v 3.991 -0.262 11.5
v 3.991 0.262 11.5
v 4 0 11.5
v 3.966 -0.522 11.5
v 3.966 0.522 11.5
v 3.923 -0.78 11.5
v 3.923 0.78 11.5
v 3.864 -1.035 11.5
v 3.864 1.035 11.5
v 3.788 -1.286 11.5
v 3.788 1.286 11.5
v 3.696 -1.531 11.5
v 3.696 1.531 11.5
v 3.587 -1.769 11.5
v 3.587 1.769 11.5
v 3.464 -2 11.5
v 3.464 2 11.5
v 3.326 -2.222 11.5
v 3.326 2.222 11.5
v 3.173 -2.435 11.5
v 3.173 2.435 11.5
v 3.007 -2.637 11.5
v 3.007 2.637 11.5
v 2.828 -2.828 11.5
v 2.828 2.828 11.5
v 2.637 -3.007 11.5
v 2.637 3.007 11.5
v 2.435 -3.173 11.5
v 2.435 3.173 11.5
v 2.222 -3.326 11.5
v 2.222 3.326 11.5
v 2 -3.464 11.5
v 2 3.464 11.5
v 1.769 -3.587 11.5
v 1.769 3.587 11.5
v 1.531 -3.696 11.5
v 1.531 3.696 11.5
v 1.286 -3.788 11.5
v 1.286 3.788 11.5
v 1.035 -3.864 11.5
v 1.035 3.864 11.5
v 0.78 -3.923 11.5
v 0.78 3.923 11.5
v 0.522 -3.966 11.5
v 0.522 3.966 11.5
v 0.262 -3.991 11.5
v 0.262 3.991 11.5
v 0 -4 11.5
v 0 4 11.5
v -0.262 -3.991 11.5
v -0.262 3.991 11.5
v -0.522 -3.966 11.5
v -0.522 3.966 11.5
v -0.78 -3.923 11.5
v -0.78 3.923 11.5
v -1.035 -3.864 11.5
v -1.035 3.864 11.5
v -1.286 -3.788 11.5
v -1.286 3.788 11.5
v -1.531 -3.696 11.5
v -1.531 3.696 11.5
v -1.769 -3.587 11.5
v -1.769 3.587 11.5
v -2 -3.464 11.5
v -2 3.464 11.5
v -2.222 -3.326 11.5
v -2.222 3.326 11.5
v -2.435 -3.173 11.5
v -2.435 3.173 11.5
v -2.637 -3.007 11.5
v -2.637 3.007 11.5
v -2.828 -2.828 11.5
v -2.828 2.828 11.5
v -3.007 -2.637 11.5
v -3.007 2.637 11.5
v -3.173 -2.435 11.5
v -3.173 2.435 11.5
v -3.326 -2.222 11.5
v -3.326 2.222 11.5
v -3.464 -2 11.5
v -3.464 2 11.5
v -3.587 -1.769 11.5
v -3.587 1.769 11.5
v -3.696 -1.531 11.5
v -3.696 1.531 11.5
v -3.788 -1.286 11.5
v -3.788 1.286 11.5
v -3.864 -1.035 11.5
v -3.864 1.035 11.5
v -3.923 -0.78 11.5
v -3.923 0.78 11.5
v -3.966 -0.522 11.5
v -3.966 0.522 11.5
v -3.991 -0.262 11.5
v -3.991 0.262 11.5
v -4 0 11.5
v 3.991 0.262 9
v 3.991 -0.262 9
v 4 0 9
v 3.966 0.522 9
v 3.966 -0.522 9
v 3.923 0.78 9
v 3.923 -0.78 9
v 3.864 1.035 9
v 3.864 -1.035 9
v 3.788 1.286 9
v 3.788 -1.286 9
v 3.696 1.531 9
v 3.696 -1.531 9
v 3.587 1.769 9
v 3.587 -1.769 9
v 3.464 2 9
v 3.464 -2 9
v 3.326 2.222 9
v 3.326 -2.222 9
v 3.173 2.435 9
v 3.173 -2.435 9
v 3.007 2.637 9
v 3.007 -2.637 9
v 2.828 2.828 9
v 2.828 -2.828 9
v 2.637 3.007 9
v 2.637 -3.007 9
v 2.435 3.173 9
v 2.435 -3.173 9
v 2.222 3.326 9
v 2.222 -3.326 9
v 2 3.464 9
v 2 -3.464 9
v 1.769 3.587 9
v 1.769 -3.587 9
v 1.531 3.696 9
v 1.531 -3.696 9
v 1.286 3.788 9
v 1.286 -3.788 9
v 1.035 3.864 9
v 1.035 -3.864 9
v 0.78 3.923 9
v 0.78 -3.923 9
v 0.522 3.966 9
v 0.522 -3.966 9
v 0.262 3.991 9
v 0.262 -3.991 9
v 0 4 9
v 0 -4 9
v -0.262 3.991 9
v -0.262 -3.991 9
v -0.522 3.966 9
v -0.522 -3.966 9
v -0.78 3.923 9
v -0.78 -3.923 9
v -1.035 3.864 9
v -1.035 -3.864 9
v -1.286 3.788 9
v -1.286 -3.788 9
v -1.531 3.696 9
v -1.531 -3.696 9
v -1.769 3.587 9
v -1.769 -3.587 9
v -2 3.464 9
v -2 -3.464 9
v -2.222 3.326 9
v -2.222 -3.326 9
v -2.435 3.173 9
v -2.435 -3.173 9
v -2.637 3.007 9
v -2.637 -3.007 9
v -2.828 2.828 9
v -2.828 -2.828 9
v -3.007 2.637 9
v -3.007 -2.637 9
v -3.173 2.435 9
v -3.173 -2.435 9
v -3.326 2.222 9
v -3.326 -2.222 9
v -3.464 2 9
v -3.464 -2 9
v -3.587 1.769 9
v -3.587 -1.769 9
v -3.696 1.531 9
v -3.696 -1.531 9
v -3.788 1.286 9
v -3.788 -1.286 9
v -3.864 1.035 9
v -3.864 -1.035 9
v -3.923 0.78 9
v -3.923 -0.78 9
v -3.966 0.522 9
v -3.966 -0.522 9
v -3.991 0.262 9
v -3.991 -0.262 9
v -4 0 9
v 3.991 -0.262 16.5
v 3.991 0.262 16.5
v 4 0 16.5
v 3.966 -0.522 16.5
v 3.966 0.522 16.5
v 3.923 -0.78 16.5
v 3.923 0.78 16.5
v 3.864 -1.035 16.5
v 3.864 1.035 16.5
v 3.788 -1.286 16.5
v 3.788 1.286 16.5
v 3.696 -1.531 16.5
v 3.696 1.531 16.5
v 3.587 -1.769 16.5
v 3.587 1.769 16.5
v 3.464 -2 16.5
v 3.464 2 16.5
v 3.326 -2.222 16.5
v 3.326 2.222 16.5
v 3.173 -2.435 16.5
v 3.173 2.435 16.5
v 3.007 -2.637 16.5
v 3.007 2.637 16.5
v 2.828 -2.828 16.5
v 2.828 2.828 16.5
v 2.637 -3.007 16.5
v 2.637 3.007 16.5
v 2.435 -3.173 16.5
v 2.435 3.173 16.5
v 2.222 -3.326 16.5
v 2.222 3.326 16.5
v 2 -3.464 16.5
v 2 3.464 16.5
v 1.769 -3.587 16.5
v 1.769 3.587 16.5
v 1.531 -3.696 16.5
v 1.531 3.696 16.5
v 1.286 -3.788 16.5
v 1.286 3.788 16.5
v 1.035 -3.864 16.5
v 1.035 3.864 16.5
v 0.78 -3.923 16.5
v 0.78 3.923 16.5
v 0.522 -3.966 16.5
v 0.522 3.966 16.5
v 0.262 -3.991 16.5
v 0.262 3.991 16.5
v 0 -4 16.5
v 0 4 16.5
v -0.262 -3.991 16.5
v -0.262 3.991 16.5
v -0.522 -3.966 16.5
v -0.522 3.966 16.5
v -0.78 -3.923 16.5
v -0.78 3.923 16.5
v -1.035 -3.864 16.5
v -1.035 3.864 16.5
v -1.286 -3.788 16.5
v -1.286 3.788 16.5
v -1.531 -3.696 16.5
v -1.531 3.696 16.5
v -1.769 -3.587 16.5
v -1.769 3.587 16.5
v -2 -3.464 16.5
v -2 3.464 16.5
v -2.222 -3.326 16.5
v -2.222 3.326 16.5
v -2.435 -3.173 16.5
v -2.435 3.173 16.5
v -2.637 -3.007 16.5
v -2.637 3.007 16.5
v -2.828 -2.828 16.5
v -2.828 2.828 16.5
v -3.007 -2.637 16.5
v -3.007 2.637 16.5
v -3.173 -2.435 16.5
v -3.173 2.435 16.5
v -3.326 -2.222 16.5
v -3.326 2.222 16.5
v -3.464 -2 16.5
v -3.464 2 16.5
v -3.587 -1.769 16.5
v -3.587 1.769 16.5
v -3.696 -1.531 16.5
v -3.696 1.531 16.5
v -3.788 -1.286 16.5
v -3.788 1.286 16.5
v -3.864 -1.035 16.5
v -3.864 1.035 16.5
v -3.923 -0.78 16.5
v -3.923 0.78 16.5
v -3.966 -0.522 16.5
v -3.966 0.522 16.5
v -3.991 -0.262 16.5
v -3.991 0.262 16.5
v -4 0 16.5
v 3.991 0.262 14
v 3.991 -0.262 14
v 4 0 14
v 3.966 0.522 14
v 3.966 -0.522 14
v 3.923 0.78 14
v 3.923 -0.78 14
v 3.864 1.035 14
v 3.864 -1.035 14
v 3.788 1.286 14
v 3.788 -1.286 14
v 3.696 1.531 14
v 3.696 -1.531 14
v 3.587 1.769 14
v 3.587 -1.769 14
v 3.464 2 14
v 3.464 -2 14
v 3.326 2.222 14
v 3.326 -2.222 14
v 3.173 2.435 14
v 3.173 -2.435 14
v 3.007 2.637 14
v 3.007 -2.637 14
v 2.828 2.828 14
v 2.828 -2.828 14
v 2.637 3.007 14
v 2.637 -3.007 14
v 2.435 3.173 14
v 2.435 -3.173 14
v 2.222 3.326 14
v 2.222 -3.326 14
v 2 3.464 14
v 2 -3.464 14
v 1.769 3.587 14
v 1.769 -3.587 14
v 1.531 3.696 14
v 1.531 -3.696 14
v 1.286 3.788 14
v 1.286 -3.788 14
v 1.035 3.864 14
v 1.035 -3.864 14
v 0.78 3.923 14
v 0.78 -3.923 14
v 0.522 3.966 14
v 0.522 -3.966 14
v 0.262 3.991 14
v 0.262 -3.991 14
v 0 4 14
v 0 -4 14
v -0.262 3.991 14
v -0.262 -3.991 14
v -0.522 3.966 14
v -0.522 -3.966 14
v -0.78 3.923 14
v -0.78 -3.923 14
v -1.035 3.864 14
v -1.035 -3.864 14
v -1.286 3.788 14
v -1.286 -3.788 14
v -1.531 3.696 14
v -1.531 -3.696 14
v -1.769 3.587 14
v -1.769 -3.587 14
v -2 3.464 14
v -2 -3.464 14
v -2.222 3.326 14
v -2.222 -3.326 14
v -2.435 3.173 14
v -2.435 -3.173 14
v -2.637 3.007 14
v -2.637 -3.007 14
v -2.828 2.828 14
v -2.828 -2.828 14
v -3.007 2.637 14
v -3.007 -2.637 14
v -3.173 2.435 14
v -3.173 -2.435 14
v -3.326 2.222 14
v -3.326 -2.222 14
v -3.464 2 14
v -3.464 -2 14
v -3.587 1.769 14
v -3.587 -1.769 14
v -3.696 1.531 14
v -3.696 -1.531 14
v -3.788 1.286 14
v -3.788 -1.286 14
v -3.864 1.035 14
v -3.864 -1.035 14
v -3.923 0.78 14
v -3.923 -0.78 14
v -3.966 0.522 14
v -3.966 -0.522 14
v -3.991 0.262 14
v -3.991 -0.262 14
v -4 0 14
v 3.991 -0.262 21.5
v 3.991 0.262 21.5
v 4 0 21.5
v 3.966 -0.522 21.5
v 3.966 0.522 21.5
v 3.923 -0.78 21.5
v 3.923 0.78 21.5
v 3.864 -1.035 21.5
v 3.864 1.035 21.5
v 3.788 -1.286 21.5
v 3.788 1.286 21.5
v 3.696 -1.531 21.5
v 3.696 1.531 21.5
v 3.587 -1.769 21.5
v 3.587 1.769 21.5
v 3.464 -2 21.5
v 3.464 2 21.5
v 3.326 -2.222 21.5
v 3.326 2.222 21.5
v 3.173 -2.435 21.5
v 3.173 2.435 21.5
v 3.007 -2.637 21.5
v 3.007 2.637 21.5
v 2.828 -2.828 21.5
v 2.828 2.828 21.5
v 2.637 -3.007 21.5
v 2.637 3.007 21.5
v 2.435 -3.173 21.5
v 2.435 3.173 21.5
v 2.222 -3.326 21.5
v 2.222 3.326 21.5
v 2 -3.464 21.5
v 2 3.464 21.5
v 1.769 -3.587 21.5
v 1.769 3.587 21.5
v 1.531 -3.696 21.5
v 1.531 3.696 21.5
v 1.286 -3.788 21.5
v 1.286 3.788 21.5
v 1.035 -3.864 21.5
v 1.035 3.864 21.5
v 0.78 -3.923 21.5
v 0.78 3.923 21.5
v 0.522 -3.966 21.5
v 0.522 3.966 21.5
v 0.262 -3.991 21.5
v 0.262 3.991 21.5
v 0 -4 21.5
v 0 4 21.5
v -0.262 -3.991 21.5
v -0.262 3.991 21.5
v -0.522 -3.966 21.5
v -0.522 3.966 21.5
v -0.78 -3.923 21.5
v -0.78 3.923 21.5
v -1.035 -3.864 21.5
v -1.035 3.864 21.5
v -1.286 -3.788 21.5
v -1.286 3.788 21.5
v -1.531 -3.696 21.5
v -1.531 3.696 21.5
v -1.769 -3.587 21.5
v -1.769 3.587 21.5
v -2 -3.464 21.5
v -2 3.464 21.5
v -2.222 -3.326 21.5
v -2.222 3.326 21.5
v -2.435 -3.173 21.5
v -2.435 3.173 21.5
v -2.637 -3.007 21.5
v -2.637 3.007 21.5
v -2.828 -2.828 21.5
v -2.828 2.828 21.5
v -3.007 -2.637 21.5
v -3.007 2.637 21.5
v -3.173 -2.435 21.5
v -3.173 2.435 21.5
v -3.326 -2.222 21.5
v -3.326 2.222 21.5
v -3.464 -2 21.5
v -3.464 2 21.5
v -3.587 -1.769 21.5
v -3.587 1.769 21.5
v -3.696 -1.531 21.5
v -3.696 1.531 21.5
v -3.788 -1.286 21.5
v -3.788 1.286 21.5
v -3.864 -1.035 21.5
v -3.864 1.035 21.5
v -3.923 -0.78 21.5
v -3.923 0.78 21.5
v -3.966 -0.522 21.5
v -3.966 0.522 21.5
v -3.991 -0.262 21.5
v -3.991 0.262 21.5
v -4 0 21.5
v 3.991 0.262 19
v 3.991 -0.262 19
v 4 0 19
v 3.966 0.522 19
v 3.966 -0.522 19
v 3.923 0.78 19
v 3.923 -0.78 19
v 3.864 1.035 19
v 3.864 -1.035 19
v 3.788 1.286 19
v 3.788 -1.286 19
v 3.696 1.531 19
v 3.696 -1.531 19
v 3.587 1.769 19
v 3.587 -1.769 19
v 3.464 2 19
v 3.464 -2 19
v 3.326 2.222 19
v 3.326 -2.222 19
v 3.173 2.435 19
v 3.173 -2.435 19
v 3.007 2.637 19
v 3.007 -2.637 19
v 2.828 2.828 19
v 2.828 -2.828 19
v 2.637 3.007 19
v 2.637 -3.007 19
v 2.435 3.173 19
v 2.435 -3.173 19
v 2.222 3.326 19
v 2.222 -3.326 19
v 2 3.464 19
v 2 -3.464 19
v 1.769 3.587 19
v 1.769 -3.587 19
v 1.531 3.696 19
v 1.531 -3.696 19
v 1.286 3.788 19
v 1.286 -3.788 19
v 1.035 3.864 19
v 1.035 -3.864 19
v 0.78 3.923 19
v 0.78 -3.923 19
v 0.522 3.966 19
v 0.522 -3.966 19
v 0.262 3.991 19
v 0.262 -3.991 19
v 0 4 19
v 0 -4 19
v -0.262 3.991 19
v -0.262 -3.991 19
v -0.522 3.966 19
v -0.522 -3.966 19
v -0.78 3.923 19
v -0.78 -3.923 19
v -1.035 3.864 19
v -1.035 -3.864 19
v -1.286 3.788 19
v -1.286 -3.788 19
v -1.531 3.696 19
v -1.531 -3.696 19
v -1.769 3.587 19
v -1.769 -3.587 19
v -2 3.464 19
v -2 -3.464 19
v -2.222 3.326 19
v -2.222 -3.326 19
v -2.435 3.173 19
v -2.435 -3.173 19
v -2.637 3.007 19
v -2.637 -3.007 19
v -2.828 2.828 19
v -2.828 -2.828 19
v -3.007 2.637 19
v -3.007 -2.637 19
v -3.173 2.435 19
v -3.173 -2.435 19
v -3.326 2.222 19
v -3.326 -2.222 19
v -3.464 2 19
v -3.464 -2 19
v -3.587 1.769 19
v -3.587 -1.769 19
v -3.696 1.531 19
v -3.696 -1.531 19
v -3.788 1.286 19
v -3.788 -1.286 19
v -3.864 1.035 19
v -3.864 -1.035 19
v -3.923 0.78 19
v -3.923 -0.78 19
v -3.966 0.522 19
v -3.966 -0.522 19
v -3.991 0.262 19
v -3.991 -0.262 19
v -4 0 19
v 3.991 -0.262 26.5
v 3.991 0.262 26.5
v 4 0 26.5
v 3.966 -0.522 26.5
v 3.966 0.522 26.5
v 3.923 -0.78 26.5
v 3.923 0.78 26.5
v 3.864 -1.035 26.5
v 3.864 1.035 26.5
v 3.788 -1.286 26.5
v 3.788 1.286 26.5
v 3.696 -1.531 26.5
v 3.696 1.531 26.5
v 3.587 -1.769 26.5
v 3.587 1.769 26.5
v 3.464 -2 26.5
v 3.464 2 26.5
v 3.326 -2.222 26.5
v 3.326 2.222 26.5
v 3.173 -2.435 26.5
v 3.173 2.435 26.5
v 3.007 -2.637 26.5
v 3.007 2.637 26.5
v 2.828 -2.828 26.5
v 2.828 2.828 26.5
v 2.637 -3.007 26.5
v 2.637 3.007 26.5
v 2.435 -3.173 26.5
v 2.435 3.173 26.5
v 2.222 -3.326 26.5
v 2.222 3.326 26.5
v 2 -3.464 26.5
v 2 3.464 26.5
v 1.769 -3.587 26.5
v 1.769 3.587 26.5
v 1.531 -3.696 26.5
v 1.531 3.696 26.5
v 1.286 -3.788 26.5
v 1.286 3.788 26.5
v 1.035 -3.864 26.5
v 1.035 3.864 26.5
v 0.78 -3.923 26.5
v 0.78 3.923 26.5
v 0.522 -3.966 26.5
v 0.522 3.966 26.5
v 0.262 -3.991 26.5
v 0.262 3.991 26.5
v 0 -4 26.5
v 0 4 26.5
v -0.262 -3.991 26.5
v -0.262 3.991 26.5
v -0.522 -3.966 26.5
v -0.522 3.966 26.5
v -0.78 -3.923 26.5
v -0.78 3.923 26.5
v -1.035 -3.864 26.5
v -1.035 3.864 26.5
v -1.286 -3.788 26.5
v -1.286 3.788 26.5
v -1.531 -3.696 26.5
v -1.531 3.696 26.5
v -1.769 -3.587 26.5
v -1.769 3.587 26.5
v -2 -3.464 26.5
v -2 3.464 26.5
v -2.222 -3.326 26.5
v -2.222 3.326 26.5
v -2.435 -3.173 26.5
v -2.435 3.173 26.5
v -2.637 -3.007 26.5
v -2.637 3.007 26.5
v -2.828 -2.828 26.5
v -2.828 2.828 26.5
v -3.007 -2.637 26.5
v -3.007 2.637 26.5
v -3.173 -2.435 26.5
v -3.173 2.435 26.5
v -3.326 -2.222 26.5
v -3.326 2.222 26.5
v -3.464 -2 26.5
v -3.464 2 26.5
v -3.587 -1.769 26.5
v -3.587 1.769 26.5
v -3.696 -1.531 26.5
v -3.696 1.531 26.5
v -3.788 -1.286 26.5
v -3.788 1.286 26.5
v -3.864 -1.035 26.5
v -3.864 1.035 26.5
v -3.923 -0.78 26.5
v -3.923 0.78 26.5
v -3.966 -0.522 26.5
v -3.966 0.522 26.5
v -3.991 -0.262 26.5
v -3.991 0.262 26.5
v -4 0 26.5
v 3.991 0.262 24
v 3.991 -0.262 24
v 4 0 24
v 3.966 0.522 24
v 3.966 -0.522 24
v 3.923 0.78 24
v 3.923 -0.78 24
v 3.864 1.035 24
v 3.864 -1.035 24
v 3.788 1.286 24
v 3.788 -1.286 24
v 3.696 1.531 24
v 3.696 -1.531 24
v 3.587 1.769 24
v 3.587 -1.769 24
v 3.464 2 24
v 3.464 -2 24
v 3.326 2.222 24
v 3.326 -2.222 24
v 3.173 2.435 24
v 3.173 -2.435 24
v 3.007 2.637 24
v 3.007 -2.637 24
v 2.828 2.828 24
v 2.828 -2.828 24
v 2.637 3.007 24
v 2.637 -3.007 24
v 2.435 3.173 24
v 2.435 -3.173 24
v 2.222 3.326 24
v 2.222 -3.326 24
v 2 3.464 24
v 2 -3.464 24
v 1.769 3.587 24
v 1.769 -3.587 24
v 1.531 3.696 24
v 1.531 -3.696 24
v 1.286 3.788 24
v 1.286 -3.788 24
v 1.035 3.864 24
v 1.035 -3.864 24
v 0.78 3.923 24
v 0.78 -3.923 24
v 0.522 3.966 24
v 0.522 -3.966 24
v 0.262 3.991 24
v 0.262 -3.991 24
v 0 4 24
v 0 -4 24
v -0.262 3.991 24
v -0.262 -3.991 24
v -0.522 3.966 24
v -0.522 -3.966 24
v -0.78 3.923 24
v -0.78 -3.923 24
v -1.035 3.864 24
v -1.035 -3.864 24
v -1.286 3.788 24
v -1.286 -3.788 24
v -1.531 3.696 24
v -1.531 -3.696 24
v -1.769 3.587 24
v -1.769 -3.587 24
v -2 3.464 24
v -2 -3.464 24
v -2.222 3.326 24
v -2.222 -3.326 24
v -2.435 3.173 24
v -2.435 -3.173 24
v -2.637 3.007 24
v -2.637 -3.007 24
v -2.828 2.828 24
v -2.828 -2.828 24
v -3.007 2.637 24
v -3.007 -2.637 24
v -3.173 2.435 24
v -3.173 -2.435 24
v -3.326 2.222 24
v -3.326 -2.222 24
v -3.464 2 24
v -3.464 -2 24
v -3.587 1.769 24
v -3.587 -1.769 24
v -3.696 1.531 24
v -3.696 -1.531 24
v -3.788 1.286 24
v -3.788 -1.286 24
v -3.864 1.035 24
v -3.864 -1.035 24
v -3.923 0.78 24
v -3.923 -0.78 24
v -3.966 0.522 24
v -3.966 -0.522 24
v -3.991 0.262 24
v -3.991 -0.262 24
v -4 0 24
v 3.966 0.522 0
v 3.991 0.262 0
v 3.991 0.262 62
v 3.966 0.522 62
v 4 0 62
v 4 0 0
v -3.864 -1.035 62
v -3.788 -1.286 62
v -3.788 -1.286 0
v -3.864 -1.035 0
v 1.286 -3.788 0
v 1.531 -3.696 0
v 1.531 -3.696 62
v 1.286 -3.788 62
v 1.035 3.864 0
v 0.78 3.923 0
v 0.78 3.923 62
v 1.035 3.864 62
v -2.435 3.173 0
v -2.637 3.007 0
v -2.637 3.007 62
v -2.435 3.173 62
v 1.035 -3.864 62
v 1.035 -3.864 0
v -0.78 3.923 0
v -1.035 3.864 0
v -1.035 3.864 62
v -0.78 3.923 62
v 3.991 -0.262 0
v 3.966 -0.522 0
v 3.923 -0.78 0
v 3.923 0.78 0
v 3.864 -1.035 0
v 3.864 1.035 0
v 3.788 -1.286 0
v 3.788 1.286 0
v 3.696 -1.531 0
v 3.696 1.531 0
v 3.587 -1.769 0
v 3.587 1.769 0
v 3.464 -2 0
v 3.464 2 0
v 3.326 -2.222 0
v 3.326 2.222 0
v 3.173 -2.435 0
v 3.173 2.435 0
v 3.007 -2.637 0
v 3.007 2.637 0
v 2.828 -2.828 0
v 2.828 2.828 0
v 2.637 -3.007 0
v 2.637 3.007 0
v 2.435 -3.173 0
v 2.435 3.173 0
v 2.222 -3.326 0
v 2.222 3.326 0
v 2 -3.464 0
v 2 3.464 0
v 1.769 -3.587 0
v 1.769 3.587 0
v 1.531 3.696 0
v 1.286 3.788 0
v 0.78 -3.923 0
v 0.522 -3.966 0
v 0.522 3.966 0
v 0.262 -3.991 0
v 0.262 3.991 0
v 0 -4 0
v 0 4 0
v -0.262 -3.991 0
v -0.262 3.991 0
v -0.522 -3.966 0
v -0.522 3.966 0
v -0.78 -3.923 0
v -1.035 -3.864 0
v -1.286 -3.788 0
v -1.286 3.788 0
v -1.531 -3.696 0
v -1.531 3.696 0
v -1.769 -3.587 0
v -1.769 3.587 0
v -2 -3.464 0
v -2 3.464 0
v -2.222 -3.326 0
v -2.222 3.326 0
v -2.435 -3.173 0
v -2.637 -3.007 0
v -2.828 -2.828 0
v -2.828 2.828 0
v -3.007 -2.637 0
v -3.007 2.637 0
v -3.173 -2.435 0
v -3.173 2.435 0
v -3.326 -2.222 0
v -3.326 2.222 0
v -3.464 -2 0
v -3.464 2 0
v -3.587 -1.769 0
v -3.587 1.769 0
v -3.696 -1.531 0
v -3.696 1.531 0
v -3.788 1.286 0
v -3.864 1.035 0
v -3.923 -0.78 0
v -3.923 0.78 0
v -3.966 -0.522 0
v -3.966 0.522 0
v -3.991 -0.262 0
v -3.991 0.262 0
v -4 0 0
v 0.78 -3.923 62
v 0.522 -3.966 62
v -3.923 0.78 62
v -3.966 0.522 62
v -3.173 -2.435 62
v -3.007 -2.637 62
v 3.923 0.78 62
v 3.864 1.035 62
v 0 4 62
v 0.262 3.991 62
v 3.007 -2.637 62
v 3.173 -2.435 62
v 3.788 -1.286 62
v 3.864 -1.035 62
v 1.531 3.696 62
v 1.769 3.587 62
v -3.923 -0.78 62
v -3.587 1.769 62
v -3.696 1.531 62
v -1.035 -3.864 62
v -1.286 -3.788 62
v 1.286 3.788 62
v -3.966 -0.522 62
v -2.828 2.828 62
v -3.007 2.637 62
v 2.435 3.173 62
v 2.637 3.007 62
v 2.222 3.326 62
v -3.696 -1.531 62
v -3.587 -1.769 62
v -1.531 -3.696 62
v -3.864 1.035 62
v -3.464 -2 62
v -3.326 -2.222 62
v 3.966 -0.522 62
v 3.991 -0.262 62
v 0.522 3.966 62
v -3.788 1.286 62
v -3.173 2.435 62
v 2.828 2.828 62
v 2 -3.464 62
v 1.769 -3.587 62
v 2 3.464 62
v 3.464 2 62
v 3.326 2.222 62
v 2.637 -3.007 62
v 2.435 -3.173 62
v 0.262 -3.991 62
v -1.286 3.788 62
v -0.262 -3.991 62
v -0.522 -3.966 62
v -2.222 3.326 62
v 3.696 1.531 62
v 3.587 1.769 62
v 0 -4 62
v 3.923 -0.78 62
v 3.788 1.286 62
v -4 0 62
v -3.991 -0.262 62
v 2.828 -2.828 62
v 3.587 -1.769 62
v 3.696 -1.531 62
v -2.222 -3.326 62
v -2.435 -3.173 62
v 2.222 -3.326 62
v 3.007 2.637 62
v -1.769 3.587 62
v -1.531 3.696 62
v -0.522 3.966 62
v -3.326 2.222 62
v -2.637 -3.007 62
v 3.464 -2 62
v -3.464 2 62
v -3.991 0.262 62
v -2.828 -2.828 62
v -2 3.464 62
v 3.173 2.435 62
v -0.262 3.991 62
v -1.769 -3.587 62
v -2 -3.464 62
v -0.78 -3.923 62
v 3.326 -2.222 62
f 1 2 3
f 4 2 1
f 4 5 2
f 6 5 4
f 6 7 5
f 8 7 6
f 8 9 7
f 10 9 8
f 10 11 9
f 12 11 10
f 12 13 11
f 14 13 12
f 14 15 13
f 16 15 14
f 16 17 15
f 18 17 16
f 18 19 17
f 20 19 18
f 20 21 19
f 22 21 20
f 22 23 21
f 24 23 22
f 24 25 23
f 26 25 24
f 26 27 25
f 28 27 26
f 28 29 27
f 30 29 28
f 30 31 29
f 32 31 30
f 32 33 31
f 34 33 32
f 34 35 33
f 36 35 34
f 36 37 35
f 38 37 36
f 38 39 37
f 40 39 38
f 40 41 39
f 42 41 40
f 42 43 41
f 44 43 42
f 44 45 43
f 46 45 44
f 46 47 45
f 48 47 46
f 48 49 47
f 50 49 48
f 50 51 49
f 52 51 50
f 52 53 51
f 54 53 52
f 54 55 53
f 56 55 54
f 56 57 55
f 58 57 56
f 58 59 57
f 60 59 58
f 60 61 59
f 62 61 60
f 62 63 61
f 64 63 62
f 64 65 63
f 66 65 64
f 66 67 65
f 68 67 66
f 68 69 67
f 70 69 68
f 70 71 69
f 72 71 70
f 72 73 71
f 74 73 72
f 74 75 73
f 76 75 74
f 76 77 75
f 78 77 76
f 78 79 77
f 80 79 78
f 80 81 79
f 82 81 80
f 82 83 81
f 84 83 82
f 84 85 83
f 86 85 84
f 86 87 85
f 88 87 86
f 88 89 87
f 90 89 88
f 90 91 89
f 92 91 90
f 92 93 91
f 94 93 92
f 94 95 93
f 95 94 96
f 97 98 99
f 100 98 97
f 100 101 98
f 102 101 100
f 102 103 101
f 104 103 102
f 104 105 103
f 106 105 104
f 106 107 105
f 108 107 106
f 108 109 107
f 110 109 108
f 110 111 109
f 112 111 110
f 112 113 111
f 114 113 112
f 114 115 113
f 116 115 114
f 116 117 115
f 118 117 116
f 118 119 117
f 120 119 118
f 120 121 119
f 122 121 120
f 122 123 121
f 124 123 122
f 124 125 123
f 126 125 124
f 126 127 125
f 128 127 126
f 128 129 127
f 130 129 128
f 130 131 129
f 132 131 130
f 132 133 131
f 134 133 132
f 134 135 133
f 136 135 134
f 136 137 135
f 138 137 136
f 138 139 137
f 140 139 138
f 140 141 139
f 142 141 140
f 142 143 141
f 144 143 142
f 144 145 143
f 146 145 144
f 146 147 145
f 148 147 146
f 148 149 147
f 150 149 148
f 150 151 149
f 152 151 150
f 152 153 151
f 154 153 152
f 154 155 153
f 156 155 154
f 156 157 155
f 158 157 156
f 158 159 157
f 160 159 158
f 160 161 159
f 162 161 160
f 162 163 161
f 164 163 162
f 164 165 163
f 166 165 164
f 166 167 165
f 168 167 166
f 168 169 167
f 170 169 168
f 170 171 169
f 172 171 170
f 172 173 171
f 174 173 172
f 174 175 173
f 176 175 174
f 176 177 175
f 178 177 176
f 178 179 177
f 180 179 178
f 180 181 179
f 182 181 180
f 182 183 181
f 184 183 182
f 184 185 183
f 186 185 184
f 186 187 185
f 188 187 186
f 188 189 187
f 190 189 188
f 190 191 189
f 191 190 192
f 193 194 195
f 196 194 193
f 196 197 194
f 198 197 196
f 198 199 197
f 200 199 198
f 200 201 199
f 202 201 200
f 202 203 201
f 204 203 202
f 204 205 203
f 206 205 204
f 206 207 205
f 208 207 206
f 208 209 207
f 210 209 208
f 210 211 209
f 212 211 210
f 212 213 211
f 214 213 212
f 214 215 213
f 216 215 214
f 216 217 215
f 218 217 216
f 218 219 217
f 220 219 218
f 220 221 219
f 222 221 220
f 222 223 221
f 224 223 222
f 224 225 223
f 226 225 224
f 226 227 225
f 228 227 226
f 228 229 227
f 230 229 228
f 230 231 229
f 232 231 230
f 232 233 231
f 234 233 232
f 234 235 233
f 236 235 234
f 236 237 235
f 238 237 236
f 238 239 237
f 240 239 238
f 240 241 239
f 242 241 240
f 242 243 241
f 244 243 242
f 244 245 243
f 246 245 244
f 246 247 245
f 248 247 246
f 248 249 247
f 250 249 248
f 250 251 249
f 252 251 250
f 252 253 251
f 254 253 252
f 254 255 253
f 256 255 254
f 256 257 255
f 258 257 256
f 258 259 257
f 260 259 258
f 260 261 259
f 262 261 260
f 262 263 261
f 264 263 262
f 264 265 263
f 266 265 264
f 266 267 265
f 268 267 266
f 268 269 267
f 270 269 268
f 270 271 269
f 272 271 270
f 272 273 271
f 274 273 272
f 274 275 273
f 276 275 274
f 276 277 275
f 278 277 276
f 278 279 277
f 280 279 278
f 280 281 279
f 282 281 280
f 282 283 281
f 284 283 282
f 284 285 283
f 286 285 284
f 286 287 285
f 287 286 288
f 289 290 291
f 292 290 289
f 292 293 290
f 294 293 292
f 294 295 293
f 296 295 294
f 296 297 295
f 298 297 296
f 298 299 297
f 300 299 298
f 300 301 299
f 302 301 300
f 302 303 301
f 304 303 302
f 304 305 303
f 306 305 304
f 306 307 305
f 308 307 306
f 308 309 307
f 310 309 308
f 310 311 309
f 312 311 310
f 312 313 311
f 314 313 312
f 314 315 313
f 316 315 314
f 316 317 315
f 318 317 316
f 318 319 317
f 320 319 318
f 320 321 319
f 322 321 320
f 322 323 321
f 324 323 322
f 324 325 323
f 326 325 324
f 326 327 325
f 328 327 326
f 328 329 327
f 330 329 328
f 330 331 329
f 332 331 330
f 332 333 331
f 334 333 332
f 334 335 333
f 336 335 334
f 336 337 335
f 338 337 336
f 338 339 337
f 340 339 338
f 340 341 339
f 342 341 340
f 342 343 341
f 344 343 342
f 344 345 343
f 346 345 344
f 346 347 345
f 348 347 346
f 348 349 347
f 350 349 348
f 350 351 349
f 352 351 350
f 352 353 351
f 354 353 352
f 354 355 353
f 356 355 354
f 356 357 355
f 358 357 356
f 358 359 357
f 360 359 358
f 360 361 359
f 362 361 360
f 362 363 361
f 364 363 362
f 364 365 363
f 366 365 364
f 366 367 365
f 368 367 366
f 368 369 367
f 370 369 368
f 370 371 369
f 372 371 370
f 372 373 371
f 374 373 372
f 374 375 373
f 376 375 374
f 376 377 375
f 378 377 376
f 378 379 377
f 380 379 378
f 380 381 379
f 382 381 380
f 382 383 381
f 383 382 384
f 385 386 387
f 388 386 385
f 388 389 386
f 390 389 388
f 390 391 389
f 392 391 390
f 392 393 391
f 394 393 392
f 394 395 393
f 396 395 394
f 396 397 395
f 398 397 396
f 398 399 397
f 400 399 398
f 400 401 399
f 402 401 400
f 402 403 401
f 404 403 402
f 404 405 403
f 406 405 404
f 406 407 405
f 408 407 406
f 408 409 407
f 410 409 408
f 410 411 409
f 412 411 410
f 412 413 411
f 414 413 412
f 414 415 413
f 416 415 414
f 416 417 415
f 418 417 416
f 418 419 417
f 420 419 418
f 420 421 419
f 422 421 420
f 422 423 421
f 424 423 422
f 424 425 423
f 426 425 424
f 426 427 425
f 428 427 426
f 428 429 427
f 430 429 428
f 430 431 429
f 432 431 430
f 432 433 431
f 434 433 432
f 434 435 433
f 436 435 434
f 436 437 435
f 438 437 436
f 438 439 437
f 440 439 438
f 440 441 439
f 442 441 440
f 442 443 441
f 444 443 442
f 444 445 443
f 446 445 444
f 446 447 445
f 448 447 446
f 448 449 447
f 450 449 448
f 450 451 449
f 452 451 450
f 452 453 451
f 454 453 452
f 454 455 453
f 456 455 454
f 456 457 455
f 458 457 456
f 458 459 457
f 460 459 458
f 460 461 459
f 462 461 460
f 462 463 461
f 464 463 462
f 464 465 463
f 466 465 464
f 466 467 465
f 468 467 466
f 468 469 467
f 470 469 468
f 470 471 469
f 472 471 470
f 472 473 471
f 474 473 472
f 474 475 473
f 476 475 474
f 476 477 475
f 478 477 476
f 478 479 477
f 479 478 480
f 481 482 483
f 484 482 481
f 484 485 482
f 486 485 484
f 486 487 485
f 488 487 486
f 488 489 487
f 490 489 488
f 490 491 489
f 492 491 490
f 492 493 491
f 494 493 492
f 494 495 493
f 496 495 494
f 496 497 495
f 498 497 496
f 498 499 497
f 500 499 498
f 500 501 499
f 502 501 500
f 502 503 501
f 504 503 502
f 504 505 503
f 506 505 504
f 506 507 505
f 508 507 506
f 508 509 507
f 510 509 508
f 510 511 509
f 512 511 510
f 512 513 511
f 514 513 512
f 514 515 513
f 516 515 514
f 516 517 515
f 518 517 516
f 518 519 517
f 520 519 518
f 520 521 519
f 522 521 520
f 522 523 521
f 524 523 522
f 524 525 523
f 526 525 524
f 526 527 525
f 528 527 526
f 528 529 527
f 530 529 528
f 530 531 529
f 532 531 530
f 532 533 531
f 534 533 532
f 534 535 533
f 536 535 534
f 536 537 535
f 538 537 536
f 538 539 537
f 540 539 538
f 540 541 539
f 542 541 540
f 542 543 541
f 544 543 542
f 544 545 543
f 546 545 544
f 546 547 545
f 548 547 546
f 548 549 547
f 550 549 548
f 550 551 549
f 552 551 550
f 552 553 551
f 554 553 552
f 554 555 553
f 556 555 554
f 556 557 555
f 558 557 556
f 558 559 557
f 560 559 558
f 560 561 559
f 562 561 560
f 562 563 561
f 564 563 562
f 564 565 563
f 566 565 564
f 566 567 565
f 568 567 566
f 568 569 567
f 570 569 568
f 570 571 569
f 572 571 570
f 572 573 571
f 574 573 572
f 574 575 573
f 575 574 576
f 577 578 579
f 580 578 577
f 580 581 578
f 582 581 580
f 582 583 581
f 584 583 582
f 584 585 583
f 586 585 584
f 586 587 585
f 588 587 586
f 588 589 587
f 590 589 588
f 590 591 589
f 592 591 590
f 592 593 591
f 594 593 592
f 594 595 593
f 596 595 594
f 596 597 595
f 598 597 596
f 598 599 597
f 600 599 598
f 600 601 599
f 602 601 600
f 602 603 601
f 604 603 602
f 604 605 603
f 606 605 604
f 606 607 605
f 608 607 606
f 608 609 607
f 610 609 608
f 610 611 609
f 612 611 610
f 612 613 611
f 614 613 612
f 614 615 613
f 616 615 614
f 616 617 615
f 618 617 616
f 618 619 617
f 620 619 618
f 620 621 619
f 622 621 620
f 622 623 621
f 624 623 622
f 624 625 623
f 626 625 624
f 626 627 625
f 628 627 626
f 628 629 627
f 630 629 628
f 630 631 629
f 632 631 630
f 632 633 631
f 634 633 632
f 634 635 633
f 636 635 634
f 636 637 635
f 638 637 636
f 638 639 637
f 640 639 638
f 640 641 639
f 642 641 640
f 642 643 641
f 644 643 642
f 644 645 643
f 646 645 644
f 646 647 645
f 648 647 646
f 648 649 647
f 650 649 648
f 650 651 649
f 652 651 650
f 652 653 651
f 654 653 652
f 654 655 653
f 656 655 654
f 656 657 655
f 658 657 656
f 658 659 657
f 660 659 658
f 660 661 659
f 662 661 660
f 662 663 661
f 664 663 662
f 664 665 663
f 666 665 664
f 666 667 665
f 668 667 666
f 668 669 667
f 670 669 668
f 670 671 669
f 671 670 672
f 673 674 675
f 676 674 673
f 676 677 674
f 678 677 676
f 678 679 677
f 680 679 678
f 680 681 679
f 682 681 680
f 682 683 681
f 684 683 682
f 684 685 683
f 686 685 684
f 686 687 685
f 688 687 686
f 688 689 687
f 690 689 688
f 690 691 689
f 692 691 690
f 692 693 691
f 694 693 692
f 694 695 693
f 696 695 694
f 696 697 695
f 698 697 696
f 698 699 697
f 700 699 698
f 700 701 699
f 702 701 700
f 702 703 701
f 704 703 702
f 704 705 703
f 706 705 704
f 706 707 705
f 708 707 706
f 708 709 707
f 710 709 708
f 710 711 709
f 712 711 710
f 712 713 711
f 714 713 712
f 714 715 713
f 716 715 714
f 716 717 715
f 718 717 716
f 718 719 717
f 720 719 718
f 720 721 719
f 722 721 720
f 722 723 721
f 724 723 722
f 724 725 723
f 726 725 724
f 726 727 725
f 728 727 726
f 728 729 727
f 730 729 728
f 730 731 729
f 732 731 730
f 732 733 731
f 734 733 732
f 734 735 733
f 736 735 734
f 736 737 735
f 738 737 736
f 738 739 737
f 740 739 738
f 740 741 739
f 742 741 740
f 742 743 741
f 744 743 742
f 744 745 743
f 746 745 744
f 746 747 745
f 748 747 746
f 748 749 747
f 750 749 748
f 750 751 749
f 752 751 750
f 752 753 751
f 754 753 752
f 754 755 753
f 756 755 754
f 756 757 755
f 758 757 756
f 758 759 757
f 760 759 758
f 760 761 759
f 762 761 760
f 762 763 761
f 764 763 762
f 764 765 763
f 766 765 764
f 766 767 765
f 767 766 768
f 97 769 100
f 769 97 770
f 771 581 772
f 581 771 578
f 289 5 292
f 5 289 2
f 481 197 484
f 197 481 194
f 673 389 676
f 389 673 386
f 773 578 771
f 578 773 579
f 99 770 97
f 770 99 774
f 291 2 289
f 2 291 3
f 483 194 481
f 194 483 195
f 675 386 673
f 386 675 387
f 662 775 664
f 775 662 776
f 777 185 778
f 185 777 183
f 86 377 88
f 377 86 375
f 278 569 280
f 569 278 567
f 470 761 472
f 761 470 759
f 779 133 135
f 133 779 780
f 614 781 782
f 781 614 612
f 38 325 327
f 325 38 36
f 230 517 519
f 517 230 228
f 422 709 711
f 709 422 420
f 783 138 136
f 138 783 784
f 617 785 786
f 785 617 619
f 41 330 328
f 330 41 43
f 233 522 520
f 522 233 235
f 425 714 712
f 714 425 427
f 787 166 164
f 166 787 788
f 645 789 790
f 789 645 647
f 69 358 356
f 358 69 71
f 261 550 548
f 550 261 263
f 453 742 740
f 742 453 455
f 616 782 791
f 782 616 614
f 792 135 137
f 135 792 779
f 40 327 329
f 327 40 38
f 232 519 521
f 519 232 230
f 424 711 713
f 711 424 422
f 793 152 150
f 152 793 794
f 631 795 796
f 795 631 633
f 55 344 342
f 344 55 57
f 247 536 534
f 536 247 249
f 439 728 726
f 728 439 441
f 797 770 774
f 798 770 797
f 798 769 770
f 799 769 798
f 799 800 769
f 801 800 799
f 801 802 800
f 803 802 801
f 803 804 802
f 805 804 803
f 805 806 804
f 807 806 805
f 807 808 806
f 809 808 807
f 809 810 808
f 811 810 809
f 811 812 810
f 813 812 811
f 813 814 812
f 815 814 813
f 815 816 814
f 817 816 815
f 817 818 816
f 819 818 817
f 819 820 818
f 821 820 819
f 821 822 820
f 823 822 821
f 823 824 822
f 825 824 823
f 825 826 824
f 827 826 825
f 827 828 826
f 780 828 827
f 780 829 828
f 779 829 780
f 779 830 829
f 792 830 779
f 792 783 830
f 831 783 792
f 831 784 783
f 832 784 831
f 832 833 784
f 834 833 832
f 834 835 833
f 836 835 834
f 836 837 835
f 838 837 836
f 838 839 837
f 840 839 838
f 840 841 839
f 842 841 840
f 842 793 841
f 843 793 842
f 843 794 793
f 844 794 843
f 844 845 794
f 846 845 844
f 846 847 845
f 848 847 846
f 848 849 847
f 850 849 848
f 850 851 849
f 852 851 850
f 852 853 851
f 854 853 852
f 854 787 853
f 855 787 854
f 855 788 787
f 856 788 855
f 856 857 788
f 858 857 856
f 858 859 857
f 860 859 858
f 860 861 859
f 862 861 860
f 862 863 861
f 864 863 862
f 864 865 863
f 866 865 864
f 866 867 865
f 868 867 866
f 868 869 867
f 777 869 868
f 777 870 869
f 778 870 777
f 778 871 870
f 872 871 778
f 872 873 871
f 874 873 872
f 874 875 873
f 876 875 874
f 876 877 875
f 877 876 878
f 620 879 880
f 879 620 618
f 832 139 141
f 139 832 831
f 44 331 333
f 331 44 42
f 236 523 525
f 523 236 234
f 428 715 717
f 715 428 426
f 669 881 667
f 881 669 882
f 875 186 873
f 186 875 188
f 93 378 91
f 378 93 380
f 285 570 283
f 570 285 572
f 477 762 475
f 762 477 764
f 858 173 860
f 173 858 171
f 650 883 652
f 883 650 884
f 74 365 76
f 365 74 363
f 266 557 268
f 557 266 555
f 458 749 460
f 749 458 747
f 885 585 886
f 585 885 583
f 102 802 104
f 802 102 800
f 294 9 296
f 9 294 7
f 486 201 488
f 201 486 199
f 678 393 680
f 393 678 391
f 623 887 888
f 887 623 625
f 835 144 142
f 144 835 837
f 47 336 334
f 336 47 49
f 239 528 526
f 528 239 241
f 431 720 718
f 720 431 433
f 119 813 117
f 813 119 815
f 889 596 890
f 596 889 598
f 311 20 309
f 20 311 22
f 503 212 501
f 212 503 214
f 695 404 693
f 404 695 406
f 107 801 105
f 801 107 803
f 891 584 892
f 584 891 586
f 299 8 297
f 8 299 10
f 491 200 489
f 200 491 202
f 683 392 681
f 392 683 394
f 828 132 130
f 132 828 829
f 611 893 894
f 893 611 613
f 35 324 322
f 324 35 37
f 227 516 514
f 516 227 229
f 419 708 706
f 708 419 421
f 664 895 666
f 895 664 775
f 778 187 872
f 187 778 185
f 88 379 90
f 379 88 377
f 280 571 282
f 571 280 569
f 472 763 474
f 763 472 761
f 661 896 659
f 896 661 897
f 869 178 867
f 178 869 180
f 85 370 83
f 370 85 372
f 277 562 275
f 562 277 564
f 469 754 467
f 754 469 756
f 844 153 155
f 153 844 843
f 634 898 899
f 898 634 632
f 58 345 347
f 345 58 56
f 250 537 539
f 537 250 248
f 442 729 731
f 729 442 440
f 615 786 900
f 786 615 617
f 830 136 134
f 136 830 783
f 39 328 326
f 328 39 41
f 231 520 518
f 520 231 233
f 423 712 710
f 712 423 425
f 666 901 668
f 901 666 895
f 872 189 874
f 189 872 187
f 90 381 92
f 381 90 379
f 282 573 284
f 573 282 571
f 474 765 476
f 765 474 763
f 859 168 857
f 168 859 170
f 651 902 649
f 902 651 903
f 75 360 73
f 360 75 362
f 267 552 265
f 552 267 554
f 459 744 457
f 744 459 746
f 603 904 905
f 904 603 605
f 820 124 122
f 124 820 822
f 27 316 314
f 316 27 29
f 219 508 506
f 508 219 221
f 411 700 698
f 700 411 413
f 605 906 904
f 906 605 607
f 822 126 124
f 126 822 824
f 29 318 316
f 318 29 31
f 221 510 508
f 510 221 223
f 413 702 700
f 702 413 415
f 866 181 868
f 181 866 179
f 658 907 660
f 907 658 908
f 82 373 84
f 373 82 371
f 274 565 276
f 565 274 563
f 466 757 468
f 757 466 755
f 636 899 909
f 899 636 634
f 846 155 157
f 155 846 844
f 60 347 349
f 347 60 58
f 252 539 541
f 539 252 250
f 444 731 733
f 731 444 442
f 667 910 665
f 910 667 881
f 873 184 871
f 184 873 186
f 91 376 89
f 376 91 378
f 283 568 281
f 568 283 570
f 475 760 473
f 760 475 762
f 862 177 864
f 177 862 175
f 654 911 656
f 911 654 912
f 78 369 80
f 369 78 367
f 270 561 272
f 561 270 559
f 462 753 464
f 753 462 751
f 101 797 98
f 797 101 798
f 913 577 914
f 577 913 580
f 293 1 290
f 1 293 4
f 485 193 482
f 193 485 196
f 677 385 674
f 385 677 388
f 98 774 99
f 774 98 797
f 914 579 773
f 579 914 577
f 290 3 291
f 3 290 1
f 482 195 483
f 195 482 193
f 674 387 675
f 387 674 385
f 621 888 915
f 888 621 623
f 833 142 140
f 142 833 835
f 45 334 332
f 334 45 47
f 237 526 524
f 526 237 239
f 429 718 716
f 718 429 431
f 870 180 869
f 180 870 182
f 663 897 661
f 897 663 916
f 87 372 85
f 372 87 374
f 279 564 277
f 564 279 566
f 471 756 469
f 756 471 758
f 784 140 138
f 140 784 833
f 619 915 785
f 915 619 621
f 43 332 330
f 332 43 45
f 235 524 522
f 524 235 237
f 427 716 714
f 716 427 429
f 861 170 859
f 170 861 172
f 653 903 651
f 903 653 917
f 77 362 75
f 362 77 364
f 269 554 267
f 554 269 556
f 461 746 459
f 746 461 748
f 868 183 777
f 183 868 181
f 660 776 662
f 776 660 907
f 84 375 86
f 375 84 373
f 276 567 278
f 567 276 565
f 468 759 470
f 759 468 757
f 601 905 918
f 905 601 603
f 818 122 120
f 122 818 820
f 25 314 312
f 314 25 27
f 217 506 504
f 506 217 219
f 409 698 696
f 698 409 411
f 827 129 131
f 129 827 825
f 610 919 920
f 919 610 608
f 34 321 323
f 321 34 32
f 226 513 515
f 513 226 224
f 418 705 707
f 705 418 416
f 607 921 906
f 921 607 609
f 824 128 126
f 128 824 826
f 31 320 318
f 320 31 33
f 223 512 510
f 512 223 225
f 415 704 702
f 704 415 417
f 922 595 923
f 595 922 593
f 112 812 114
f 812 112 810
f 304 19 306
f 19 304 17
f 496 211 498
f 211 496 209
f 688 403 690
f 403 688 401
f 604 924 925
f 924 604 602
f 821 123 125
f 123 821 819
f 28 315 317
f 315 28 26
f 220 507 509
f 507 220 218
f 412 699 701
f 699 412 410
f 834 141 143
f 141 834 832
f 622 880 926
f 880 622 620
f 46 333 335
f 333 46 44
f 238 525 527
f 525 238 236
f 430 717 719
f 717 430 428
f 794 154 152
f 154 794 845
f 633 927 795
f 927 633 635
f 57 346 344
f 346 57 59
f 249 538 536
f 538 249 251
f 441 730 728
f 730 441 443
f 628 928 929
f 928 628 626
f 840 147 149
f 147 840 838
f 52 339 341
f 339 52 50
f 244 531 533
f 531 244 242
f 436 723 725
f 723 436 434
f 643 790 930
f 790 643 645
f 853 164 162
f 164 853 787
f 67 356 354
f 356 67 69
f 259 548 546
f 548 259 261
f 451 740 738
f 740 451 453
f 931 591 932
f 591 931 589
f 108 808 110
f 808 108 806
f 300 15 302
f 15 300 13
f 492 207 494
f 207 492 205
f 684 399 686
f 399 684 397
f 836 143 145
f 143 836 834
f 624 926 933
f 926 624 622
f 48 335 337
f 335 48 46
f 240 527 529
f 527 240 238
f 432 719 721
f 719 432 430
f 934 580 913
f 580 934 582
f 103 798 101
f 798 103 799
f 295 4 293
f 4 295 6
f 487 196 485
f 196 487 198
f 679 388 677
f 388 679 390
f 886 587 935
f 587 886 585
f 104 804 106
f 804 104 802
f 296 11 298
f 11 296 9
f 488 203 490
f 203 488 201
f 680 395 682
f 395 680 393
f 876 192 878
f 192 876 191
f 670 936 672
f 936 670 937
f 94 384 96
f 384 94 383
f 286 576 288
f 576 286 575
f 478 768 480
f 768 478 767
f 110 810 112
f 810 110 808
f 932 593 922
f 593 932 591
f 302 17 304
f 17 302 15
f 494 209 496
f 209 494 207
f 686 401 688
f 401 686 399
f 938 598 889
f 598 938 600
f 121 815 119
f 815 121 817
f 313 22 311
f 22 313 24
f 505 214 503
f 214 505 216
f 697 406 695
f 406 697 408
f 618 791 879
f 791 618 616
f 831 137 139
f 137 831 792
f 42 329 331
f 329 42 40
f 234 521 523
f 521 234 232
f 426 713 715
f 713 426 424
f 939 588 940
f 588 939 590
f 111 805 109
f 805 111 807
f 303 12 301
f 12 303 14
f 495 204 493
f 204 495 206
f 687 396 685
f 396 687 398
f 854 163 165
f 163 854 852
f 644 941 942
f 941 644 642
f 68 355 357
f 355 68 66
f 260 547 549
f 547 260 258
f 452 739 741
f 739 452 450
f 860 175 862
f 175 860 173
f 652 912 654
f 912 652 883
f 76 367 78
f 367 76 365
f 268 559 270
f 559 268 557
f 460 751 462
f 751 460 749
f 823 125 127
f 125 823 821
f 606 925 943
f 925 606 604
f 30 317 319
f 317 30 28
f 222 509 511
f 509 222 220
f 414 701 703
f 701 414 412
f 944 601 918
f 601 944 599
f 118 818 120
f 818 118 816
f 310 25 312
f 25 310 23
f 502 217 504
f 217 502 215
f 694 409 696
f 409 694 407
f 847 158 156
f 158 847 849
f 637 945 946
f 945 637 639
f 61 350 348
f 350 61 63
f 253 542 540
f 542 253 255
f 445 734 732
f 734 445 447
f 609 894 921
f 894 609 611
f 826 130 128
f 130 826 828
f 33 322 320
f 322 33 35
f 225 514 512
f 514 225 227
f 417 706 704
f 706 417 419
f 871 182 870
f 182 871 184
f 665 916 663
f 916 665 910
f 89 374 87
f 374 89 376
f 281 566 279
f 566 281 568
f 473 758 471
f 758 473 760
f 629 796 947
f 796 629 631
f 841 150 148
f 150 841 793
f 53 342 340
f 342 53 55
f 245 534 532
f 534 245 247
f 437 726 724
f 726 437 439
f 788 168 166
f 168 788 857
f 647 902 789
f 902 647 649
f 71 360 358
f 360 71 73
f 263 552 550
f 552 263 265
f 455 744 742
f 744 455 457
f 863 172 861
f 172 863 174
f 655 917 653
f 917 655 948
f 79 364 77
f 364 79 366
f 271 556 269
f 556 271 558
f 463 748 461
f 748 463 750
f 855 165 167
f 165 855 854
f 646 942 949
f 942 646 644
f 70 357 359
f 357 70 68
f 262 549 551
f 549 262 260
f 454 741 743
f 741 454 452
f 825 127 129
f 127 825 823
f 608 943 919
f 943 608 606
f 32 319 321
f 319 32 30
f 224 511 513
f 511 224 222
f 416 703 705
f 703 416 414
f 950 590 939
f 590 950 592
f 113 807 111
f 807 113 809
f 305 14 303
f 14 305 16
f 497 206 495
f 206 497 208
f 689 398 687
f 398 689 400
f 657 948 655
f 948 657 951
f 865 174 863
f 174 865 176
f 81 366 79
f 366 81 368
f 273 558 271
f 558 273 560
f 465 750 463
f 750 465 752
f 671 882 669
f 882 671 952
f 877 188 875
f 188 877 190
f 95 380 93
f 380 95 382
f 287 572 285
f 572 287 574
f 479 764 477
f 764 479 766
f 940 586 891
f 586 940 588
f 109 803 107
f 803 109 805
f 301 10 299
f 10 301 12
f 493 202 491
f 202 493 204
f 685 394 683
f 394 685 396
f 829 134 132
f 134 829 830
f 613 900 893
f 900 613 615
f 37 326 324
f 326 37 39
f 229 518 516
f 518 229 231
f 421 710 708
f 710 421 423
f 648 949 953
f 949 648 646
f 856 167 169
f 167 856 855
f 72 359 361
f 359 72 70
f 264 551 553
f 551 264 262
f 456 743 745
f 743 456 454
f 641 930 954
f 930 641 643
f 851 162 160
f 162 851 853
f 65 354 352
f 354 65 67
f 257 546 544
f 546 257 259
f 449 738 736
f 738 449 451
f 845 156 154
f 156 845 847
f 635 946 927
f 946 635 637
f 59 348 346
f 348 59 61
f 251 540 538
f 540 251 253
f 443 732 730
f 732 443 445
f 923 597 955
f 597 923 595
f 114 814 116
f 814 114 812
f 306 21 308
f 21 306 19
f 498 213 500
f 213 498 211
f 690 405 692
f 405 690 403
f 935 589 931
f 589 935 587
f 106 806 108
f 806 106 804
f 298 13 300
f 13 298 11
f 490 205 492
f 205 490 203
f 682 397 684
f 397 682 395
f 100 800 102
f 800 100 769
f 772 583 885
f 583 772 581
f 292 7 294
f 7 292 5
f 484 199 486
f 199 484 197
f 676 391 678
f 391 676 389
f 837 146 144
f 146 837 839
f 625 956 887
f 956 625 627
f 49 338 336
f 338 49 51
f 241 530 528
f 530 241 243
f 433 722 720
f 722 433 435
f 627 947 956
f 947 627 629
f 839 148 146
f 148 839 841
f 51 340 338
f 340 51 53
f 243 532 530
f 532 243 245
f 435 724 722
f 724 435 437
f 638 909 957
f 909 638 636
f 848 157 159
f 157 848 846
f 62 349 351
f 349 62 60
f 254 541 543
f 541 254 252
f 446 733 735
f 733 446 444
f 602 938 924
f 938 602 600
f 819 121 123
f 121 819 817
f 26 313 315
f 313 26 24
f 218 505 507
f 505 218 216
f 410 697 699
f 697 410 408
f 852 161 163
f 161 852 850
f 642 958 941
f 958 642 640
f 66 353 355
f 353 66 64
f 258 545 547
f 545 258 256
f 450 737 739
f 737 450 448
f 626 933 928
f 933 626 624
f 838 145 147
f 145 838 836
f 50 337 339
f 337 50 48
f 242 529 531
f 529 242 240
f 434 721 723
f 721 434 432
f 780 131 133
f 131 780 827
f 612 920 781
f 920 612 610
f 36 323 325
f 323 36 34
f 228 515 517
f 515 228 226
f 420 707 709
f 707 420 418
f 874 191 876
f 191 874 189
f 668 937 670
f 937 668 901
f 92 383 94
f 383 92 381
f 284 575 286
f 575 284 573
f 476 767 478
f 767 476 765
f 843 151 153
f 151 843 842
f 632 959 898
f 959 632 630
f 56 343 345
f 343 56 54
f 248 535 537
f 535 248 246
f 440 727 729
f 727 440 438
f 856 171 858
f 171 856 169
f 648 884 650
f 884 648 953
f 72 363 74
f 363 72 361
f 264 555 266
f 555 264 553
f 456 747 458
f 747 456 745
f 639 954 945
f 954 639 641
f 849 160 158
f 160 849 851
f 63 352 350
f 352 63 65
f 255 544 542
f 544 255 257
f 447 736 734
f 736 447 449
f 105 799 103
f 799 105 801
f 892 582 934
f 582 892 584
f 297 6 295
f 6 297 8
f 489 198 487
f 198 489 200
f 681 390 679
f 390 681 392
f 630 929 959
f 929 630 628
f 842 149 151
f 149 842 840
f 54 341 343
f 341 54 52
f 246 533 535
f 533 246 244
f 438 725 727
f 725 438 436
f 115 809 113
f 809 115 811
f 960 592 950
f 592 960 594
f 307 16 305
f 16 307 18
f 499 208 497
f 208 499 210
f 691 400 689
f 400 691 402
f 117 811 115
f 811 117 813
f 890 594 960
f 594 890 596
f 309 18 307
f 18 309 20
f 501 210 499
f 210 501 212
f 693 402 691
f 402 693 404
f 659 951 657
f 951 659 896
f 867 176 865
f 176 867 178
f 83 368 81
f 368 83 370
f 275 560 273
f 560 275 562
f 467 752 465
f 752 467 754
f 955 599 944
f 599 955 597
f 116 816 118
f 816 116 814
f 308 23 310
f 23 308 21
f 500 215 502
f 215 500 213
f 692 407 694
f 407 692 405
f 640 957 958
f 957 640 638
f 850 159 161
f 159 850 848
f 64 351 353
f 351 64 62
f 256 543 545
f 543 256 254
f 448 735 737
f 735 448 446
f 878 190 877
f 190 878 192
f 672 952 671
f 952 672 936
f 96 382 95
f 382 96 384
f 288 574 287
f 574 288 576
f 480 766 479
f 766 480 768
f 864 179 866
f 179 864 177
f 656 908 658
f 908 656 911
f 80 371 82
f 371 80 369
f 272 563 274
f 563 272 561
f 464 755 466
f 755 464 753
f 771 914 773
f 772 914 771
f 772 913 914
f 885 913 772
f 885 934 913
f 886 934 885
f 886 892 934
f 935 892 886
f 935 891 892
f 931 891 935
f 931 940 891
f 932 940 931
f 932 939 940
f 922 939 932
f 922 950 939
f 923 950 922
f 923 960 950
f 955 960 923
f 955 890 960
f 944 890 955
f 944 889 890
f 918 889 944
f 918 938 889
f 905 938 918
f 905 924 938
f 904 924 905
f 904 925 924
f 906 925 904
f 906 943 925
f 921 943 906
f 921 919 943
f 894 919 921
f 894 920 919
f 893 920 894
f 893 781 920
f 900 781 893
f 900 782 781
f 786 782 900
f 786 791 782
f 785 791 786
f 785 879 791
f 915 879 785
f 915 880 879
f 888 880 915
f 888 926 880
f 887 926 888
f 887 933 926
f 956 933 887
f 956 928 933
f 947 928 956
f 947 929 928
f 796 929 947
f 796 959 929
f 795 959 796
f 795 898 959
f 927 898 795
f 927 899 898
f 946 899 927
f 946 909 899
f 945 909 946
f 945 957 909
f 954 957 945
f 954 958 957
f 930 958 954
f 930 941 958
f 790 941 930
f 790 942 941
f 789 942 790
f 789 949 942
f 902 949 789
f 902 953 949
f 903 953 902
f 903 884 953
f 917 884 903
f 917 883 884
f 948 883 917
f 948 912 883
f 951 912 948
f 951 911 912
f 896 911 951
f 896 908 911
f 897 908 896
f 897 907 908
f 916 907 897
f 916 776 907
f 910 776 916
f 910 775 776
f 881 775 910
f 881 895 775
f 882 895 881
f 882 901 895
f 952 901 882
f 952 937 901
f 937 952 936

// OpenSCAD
// Pestle for 1.5 mL microcentrifuge tube
// Print orientation: standing upright, bottom on bed (z = 0)

$fn = 96;

// ---- Dimensions (mm) ----
handle_d      = 8;    // handle diameter
handle_h      = 45;   // handle height (z = 0 to 45)
cone_top_d    = 8;    // cone diameter at z = 45
cone_bot_d    = 3;    // cone diameter at z = 62
cone_h        = 17;   // cone height (z = 45 to 62)
tip_r         = 3;    // rounded tip radius (z = 62)
groove_count  = 4;    // number of circumferential grooves
groove_w      = 2;    // groove width in Z
groove_d      = 1;    // groove depth
overlap       = 0.5;  // overlap between adjacent grooves

eps           = 0.5;  // overshoot for clean boolean cuts

// ---- Derived ----
groove_start  = [10, 15, 20, 25];  // groove centre heights

// ---- Model ----
module pestle() {
    union() {
        // Handle with grooves
        translate([0, 0, 0])
            difference() {
                cylinder(d = handle_d, h = handle_h);
                for (g = groove_start)
                    translate([0, 0, g - groove_w / 2])
                        cylinder(d = handle_d + 2 * eps, h = groove_w + eps);
            }

        // Cone (tapered from top of handle to tip)
        translate([0, 0, handle_h - overlap])
            linear_extrude(height = cone_h + overlap)
                circle(d = cone_top_d);

        // Rounded tip
        translate([0, 0, 62 - tip_r])
            sphere(r = tip_r);
    }
}

pestle();
